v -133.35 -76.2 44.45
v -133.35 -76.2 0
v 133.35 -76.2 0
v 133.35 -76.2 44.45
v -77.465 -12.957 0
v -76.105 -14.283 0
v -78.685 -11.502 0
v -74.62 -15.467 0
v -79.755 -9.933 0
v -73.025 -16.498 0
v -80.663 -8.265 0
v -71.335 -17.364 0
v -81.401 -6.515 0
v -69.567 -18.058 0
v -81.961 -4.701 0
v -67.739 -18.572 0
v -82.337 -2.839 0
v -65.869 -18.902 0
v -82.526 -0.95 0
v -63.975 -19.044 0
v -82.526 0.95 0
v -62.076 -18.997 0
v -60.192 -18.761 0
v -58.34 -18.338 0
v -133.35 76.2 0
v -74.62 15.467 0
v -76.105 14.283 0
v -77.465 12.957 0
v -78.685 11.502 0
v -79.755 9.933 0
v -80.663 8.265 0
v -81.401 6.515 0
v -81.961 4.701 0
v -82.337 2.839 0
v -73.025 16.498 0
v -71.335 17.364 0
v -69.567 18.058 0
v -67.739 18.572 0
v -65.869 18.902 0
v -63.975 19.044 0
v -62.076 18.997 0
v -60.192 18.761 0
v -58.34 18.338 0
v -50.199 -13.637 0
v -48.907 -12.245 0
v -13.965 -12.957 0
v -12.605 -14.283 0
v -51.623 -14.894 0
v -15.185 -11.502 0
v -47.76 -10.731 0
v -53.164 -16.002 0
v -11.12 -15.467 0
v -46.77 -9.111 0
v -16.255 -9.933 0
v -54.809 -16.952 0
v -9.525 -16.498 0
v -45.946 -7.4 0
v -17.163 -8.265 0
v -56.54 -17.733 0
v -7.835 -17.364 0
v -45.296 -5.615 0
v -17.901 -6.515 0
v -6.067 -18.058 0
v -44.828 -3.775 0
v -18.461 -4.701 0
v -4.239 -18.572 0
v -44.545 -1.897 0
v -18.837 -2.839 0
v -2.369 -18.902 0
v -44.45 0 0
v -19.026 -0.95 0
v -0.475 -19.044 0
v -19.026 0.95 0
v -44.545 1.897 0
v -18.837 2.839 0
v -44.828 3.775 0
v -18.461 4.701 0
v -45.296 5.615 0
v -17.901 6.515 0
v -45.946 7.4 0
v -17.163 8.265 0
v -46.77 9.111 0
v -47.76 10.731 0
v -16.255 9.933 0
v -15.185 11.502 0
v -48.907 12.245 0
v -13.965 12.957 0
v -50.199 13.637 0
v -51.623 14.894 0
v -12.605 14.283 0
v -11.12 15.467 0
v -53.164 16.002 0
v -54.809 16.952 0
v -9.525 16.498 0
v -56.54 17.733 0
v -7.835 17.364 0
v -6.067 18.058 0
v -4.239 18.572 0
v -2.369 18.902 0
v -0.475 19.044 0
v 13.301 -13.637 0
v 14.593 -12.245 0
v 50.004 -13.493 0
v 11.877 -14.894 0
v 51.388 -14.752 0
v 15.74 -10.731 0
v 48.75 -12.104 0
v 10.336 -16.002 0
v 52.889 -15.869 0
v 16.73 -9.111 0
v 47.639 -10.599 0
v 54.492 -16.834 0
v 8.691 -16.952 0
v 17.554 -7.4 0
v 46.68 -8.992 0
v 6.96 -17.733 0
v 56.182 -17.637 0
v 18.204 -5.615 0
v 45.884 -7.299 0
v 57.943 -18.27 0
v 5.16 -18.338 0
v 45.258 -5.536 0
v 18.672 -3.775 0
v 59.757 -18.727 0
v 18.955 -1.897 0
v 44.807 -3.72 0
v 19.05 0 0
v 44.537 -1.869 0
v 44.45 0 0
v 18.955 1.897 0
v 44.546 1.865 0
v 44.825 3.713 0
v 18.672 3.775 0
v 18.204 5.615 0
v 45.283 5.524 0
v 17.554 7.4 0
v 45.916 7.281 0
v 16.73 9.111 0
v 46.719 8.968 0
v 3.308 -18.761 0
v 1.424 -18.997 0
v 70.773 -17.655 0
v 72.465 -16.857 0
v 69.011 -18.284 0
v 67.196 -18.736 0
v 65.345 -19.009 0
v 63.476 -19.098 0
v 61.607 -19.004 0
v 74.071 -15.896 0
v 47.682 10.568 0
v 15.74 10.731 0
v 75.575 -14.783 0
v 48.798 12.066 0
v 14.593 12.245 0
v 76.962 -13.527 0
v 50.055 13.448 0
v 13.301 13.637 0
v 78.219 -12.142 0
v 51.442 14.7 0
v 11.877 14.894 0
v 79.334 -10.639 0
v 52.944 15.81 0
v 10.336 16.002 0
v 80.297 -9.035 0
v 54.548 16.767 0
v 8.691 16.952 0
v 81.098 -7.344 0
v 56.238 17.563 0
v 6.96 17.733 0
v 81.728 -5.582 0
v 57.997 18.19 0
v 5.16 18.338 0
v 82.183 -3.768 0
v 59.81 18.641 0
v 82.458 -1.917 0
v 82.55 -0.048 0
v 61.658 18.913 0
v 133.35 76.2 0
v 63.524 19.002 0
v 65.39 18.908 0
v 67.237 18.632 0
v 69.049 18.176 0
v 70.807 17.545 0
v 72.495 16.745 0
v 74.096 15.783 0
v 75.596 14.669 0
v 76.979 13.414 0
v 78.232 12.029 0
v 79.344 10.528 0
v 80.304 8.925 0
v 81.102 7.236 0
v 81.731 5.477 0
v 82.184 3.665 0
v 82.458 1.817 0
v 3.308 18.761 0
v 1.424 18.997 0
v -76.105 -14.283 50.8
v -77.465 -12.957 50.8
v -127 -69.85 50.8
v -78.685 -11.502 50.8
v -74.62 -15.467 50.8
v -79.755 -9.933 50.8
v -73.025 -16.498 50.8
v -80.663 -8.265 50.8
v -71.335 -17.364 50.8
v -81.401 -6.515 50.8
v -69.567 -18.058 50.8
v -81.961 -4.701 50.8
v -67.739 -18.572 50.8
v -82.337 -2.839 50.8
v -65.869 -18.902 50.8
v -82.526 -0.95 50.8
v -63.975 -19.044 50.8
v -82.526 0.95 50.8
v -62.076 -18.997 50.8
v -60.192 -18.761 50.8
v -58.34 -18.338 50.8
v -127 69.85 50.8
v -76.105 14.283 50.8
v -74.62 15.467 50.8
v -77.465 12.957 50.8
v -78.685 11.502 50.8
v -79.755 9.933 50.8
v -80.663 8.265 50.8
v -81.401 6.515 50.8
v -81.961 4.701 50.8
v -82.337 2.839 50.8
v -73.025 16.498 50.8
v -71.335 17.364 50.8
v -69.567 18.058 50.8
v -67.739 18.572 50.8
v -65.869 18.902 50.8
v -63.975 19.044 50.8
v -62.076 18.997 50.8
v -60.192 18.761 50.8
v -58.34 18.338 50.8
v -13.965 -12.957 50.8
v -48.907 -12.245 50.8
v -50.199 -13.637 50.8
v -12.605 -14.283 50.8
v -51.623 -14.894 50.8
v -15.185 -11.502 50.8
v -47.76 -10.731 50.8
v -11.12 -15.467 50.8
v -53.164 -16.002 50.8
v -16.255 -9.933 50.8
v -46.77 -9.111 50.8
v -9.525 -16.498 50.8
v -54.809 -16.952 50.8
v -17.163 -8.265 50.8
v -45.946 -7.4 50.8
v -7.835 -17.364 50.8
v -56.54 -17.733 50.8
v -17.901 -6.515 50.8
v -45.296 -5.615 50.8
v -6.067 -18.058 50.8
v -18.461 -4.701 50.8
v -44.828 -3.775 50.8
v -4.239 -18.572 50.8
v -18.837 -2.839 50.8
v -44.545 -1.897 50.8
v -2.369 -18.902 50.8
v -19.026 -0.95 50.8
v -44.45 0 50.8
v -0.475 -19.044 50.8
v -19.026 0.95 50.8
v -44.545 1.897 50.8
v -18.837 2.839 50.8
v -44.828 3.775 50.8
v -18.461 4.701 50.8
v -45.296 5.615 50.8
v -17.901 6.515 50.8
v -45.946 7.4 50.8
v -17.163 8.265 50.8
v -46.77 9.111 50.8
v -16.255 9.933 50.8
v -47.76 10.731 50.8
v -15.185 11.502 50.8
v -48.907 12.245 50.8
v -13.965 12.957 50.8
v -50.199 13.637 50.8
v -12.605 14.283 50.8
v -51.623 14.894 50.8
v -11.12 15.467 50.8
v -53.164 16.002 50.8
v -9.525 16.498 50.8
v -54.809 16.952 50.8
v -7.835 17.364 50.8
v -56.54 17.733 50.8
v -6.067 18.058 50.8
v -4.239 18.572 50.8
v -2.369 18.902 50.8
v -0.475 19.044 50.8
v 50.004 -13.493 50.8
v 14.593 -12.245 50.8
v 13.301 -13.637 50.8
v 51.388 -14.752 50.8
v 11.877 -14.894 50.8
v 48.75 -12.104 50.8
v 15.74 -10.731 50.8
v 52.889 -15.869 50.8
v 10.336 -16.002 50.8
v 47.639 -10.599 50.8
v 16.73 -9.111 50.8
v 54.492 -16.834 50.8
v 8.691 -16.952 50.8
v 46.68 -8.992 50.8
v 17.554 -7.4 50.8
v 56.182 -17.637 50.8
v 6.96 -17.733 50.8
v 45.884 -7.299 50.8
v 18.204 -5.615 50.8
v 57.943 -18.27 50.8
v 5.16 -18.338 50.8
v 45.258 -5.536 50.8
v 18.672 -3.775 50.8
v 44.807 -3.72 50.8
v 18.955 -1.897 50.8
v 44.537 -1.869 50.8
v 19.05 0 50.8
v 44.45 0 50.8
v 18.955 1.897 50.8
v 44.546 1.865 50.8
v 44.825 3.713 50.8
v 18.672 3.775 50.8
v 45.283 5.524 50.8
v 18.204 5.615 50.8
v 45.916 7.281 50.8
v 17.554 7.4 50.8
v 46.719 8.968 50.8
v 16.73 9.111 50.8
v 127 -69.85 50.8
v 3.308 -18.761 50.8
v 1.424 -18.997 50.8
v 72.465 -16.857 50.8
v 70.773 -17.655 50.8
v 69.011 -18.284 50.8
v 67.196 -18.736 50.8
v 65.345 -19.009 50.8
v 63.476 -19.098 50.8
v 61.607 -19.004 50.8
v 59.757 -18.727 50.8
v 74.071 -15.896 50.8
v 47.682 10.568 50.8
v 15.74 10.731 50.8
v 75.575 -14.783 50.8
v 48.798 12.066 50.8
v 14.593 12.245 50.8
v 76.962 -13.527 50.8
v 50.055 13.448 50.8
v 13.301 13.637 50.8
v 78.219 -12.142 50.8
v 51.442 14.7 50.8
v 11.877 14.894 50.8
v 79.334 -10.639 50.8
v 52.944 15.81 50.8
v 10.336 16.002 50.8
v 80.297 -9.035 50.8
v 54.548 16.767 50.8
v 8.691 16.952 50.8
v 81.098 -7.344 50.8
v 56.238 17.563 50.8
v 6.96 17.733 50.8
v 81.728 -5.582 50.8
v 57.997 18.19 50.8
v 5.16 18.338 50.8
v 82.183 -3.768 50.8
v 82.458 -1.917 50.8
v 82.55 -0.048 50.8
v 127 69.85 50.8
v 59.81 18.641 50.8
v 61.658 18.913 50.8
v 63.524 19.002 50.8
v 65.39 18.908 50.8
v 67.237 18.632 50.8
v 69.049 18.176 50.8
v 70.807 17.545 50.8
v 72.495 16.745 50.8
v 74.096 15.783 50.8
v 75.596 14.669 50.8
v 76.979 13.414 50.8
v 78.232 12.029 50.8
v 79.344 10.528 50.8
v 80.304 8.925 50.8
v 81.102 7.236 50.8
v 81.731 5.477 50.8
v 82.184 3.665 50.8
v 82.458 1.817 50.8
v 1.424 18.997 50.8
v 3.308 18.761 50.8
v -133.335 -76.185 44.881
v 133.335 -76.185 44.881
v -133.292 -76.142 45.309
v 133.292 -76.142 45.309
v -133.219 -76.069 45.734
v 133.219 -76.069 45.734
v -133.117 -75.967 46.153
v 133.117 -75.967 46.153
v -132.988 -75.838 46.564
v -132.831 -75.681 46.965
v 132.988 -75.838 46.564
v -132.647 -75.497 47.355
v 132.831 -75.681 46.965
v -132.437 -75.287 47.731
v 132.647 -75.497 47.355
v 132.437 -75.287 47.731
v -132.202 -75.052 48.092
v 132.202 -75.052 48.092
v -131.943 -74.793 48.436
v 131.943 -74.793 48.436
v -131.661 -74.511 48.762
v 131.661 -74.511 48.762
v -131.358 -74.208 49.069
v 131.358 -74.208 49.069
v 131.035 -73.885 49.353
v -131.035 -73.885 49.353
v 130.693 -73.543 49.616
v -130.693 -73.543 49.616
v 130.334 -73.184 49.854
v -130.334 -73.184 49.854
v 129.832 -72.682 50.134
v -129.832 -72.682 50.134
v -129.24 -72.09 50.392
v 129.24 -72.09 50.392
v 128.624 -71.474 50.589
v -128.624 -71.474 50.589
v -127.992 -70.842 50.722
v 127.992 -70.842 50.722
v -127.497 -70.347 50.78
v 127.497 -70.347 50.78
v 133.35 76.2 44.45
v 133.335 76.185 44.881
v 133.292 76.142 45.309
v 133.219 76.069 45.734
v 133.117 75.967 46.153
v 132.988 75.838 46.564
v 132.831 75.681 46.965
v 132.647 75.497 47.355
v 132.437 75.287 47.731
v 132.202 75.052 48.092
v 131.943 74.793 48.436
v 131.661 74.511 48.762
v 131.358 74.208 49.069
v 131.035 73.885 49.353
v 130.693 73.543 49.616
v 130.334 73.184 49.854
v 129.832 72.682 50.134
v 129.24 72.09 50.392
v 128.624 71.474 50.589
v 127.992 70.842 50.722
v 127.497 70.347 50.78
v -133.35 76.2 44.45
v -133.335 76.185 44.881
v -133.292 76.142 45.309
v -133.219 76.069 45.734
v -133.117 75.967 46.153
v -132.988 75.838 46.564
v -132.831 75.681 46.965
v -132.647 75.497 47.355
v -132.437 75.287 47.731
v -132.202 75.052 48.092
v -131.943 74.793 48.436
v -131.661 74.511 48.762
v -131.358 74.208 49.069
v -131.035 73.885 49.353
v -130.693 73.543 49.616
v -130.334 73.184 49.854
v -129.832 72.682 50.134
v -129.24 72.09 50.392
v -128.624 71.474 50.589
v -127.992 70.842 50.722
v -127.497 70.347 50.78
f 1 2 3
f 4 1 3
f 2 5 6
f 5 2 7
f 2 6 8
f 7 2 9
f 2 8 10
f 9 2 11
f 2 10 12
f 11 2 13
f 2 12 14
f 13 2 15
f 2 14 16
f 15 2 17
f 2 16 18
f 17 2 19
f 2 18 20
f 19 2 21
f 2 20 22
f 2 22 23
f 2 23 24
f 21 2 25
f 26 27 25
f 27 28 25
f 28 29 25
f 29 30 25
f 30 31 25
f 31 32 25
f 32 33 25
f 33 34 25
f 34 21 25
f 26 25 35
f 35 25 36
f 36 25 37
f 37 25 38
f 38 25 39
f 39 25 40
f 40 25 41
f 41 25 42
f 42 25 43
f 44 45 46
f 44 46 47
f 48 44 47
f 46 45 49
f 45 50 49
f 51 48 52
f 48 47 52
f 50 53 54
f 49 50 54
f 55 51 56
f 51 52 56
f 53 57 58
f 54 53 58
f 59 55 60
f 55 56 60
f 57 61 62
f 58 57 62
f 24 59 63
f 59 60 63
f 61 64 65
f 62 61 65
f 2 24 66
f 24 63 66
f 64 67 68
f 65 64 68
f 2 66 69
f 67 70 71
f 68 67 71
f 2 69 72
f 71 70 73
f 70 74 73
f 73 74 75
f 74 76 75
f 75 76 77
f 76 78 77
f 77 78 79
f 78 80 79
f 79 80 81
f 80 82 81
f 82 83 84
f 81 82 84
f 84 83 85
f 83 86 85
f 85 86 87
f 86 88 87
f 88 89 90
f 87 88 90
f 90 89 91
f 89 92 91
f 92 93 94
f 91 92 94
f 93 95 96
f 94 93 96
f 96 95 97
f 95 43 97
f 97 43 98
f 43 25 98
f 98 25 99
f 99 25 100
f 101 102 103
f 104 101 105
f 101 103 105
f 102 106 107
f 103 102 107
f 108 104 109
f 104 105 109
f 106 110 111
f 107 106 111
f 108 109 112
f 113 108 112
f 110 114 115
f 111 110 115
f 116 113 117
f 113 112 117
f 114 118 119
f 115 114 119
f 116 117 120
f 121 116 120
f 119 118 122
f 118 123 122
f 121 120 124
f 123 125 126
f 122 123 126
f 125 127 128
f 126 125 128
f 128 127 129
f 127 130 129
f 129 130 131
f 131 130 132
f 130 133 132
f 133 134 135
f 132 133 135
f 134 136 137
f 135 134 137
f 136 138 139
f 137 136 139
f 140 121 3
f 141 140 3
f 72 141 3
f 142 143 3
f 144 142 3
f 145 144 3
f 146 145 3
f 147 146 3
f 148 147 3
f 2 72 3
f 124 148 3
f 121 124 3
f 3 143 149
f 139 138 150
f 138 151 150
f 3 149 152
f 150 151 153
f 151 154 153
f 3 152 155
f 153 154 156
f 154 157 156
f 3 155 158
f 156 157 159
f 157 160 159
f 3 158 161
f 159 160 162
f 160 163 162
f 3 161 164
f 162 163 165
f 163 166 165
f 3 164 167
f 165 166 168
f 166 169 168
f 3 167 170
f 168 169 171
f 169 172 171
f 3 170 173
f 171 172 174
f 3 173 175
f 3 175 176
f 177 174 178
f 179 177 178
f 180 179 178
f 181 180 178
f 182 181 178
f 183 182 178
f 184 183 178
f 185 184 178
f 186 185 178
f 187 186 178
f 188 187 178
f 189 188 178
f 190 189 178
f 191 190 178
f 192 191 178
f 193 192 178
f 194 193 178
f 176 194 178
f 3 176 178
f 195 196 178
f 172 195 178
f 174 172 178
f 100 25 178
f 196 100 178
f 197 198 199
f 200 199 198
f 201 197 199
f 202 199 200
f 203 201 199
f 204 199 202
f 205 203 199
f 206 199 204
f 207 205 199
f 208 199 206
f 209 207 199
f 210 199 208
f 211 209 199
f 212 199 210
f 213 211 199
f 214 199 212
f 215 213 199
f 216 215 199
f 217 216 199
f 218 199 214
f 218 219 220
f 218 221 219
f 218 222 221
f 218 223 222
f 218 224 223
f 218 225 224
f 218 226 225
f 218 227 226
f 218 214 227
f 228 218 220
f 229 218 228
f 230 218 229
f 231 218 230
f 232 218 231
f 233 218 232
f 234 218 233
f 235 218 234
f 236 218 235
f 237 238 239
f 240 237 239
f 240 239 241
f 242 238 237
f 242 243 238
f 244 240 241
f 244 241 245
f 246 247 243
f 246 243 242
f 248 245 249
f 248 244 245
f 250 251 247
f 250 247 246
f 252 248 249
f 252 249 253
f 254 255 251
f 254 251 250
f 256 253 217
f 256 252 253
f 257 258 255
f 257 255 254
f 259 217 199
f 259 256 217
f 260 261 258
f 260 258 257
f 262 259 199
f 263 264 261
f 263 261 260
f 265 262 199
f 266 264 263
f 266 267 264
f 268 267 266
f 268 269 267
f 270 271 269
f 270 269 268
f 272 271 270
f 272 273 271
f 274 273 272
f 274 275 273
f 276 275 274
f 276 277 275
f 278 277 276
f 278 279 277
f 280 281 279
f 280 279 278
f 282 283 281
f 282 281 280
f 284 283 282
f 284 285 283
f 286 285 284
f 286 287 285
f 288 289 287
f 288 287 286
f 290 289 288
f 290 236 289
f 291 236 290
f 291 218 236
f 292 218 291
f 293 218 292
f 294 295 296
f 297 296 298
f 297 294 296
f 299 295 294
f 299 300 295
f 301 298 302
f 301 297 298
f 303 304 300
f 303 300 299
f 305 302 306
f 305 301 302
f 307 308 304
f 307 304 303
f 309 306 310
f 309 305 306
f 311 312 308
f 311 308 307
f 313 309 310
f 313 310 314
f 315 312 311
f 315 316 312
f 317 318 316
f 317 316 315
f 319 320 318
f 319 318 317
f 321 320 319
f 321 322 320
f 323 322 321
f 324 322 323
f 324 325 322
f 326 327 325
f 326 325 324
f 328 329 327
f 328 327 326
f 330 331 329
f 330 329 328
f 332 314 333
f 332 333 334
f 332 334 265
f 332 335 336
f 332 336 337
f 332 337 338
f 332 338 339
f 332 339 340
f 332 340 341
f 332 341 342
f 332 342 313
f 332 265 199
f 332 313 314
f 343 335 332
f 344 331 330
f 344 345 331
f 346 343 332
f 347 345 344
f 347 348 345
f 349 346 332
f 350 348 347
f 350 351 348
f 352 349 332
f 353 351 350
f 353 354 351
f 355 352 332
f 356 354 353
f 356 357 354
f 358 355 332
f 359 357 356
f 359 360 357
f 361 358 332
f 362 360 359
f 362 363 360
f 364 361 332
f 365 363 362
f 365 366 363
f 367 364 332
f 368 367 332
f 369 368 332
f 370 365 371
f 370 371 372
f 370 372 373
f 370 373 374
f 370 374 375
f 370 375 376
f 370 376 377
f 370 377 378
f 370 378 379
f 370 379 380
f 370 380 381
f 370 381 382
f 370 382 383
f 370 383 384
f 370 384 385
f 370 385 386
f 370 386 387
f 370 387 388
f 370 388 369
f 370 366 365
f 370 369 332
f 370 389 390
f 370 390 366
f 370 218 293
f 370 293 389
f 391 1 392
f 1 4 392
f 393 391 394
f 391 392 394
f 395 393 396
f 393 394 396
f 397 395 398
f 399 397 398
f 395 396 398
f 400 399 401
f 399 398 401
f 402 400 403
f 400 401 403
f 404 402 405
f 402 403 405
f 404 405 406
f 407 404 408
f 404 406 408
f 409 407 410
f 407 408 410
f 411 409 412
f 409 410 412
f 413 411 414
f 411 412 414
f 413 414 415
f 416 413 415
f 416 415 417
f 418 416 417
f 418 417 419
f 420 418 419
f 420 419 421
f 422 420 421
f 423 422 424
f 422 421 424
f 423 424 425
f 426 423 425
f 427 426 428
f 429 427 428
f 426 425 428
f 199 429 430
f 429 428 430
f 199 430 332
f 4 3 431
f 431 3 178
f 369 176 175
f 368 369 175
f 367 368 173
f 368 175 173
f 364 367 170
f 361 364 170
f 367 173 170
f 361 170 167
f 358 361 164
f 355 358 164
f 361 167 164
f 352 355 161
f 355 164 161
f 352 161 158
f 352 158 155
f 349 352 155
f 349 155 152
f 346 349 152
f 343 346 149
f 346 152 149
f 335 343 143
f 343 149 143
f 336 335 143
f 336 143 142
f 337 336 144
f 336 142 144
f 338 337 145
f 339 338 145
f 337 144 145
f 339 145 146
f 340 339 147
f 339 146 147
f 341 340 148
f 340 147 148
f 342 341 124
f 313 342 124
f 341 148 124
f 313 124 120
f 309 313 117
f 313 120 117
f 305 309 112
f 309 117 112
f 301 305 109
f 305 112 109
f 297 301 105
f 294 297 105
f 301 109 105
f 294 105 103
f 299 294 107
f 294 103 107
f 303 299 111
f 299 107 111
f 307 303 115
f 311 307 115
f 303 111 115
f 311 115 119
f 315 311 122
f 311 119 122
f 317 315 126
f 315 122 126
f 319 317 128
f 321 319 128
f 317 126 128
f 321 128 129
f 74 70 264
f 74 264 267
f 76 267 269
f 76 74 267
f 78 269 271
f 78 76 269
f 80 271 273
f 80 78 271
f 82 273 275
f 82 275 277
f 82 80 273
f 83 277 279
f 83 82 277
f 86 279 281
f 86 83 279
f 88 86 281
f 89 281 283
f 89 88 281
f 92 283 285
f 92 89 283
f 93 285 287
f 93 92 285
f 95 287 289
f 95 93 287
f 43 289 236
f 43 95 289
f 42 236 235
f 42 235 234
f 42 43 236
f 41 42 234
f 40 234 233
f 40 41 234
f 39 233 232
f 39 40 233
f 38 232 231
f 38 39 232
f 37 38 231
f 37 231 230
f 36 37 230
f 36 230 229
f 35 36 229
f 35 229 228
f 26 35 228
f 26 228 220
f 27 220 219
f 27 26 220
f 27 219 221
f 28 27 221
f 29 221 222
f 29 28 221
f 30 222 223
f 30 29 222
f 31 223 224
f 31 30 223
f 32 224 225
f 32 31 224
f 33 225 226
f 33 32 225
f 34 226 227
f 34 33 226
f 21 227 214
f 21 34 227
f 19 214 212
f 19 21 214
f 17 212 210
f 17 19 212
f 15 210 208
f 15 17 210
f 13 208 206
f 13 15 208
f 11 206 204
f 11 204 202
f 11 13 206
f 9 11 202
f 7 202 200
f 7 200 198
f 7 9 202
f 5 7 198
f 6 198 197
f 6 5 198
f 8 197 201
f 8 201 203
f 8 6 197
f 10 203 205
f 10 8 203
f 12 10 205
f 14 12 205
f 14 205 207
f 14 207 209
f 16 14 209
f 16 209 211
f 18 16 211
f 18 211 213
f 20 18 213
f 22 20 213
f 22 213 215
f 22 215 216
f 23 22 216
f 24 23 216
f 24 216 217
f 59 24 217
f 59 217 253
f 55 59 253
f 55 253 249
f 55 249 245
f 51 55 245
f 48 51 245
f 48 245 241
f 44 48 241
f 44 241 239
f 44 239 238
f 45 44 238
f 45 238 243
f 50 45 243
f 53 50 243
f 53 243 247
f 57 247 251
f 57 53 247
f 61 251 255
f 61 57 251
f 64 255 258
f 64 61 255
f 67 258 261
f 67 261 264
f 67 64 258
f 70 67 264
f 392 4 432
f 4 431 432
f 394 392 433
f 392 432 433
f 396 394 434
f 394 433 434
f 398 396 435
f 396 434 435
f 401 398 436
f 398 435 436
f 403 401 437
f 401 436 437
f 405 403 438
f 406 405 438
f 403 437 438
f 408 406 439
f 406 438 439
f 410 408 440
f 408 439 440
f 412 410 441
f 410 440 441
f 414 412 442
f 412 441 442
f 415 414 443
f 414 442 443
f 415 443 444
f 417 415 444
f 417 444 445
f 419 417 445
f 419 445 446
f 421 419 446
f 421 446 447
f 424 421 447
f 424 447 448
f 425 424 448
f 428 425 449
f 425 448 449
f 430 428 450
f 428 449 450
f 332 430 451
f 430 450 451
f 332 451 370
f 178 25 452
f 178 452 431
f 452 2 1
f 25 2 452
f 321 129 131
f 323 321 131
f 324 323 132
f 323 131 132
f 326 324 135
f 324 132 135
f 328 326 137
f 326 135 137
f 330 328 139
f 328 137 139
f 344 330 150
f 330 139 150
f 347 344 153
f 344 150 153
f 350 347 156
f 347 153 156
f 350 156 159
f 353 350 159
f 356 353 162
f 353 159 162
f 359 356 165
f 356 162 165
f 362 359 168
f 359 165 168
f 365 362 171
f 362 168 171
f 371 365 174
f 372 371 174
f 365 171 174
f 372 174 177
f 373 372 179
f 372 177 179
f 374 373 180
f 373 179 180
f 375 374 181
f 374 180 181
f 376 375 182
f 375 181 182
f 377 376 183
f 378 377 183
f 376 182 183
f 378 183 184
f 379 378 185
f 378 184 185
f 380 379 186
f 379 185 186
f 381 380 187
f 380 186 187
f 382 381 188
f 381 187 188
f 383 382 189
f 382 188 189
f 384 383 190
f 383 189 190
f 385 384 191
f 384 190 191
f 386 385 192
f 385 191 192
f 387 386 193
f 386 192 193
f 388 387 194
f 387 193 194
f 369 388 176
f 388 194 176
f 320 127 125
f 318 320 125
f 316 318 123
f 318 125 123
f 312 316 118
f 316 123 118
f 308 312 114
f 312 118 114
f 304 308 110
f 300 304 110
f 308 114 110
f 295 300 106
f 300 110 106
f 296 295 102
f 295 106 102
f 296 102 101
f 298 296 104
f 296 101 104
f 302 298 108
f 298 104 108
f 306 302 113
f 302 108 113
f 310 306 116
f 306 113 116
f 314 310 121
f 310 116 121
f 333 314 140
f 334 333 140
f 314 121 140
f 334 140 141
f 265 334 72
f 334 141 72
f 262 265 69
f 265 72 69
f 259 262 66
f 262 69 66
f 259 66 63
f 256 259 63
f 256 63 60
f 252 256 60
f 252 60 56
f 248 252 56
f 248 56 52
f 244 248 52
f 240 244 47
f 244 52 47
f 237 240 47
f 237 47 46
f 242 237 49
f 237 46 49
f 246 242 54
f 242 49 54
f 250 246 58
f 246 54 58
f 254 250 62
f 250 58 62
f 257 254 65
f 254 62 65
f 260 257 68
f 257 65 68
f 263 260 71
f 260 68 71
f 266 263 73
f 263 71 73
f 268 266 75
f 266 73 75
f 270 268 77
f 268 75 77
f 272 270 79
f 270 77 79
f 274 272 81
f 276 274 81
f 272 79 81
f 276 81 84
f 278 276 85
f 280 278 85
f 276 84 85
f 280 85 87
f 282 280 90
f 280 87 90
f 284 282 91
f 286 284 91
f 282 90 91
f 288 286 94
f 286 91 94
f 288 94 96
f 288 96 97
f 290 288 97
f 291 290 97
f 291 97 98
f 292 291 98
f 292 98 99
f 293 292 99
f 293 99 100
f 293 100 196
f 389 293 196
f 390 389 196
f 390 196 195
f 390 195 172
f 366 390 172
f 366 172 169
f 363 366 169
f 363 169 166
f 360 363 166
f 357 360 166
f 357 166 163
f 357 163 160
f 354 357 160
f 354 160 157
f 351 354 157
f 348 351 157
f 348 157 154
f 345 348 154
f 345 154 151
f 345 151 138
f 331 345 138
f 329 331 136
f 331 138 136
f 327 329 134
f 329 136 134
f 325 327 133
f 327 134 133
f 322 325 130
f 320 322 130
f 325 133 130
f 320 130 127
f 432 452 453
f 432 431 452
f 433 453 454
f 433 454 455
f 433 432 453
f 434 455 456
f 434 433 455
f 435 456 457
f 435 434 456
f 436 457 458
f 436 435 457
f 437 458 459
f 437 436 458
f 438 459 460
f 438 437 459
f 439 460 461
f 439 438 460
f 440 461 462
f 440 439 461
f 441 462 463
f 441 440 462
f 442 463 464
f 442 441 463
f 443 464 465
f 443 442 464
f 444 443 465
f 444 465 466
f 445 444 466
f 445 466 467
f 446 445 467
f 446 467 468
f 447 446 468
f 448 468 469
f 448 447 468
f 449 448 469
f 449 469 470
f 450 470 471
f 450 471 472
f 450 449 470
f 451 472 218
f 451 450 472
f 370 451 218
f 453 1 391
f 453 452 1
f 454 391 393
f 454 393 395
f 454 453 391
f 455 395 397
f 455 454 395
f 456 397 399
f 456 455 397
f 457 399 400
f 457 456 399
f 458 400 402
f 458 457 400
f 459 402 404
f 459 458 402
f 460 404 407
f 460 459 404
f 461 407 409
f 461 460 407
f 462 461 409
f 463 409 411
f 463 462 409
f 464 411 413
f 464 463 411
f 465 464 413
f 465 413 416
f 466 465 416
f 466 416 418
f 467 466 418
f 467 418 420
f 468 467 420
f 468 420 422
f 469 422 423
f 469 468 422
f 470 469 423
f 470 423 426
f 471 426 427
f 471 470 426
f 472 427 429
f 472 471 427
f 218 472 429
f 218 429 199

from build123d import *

# Parameters (mm, degrees)
F0_W     = 266.7
F0_H     = 152.4
F0_R     = 19.05
F1_DEPTH = 50.8
F2_R     = 6.35


with BuildPart() as f1:
    # F0 (on Top) → F1 (new body)
    with BuildSketch(Plane.XY):
        Rectangle(F0_W, F0_H)
        with BuildLine():
            ThreePointArc((82.549939, -0.048241), (63.475818, -19.098226), (44.45, 0))
            ThreePointArc((44.45, 0), (63.52406, 19.001743), (82.549939, -0.048241))
        make_face(mode=Mode.SUBTRACT)
        with Locations((-63.5, 0)):
            Circle(F0_R, mode=Mode.SUBTRACT)
        with BuildLine():
            ThreePointArc((-19.05, 0), (0, 19.05), (19.05, 0))
            ThreePointArc((19.05, 0), (0, -19.05), (-19.05, 0))
        make_face(mode=Mode.SUBTRACT)
    extrude(amount=F1_DEPTH)

    # F2
    f2_edges = [f1.edges().sort_by_distance(p)[0] for p in [
        (0, -76.2, 50.8),
        (133.35, 0, 50.8),
        (0, 76.2, 50.8),
        (-133.35, 0, 50.8),
    ]]
    fillet(f2_edges, radius=F2_R)


solid = f1.part
